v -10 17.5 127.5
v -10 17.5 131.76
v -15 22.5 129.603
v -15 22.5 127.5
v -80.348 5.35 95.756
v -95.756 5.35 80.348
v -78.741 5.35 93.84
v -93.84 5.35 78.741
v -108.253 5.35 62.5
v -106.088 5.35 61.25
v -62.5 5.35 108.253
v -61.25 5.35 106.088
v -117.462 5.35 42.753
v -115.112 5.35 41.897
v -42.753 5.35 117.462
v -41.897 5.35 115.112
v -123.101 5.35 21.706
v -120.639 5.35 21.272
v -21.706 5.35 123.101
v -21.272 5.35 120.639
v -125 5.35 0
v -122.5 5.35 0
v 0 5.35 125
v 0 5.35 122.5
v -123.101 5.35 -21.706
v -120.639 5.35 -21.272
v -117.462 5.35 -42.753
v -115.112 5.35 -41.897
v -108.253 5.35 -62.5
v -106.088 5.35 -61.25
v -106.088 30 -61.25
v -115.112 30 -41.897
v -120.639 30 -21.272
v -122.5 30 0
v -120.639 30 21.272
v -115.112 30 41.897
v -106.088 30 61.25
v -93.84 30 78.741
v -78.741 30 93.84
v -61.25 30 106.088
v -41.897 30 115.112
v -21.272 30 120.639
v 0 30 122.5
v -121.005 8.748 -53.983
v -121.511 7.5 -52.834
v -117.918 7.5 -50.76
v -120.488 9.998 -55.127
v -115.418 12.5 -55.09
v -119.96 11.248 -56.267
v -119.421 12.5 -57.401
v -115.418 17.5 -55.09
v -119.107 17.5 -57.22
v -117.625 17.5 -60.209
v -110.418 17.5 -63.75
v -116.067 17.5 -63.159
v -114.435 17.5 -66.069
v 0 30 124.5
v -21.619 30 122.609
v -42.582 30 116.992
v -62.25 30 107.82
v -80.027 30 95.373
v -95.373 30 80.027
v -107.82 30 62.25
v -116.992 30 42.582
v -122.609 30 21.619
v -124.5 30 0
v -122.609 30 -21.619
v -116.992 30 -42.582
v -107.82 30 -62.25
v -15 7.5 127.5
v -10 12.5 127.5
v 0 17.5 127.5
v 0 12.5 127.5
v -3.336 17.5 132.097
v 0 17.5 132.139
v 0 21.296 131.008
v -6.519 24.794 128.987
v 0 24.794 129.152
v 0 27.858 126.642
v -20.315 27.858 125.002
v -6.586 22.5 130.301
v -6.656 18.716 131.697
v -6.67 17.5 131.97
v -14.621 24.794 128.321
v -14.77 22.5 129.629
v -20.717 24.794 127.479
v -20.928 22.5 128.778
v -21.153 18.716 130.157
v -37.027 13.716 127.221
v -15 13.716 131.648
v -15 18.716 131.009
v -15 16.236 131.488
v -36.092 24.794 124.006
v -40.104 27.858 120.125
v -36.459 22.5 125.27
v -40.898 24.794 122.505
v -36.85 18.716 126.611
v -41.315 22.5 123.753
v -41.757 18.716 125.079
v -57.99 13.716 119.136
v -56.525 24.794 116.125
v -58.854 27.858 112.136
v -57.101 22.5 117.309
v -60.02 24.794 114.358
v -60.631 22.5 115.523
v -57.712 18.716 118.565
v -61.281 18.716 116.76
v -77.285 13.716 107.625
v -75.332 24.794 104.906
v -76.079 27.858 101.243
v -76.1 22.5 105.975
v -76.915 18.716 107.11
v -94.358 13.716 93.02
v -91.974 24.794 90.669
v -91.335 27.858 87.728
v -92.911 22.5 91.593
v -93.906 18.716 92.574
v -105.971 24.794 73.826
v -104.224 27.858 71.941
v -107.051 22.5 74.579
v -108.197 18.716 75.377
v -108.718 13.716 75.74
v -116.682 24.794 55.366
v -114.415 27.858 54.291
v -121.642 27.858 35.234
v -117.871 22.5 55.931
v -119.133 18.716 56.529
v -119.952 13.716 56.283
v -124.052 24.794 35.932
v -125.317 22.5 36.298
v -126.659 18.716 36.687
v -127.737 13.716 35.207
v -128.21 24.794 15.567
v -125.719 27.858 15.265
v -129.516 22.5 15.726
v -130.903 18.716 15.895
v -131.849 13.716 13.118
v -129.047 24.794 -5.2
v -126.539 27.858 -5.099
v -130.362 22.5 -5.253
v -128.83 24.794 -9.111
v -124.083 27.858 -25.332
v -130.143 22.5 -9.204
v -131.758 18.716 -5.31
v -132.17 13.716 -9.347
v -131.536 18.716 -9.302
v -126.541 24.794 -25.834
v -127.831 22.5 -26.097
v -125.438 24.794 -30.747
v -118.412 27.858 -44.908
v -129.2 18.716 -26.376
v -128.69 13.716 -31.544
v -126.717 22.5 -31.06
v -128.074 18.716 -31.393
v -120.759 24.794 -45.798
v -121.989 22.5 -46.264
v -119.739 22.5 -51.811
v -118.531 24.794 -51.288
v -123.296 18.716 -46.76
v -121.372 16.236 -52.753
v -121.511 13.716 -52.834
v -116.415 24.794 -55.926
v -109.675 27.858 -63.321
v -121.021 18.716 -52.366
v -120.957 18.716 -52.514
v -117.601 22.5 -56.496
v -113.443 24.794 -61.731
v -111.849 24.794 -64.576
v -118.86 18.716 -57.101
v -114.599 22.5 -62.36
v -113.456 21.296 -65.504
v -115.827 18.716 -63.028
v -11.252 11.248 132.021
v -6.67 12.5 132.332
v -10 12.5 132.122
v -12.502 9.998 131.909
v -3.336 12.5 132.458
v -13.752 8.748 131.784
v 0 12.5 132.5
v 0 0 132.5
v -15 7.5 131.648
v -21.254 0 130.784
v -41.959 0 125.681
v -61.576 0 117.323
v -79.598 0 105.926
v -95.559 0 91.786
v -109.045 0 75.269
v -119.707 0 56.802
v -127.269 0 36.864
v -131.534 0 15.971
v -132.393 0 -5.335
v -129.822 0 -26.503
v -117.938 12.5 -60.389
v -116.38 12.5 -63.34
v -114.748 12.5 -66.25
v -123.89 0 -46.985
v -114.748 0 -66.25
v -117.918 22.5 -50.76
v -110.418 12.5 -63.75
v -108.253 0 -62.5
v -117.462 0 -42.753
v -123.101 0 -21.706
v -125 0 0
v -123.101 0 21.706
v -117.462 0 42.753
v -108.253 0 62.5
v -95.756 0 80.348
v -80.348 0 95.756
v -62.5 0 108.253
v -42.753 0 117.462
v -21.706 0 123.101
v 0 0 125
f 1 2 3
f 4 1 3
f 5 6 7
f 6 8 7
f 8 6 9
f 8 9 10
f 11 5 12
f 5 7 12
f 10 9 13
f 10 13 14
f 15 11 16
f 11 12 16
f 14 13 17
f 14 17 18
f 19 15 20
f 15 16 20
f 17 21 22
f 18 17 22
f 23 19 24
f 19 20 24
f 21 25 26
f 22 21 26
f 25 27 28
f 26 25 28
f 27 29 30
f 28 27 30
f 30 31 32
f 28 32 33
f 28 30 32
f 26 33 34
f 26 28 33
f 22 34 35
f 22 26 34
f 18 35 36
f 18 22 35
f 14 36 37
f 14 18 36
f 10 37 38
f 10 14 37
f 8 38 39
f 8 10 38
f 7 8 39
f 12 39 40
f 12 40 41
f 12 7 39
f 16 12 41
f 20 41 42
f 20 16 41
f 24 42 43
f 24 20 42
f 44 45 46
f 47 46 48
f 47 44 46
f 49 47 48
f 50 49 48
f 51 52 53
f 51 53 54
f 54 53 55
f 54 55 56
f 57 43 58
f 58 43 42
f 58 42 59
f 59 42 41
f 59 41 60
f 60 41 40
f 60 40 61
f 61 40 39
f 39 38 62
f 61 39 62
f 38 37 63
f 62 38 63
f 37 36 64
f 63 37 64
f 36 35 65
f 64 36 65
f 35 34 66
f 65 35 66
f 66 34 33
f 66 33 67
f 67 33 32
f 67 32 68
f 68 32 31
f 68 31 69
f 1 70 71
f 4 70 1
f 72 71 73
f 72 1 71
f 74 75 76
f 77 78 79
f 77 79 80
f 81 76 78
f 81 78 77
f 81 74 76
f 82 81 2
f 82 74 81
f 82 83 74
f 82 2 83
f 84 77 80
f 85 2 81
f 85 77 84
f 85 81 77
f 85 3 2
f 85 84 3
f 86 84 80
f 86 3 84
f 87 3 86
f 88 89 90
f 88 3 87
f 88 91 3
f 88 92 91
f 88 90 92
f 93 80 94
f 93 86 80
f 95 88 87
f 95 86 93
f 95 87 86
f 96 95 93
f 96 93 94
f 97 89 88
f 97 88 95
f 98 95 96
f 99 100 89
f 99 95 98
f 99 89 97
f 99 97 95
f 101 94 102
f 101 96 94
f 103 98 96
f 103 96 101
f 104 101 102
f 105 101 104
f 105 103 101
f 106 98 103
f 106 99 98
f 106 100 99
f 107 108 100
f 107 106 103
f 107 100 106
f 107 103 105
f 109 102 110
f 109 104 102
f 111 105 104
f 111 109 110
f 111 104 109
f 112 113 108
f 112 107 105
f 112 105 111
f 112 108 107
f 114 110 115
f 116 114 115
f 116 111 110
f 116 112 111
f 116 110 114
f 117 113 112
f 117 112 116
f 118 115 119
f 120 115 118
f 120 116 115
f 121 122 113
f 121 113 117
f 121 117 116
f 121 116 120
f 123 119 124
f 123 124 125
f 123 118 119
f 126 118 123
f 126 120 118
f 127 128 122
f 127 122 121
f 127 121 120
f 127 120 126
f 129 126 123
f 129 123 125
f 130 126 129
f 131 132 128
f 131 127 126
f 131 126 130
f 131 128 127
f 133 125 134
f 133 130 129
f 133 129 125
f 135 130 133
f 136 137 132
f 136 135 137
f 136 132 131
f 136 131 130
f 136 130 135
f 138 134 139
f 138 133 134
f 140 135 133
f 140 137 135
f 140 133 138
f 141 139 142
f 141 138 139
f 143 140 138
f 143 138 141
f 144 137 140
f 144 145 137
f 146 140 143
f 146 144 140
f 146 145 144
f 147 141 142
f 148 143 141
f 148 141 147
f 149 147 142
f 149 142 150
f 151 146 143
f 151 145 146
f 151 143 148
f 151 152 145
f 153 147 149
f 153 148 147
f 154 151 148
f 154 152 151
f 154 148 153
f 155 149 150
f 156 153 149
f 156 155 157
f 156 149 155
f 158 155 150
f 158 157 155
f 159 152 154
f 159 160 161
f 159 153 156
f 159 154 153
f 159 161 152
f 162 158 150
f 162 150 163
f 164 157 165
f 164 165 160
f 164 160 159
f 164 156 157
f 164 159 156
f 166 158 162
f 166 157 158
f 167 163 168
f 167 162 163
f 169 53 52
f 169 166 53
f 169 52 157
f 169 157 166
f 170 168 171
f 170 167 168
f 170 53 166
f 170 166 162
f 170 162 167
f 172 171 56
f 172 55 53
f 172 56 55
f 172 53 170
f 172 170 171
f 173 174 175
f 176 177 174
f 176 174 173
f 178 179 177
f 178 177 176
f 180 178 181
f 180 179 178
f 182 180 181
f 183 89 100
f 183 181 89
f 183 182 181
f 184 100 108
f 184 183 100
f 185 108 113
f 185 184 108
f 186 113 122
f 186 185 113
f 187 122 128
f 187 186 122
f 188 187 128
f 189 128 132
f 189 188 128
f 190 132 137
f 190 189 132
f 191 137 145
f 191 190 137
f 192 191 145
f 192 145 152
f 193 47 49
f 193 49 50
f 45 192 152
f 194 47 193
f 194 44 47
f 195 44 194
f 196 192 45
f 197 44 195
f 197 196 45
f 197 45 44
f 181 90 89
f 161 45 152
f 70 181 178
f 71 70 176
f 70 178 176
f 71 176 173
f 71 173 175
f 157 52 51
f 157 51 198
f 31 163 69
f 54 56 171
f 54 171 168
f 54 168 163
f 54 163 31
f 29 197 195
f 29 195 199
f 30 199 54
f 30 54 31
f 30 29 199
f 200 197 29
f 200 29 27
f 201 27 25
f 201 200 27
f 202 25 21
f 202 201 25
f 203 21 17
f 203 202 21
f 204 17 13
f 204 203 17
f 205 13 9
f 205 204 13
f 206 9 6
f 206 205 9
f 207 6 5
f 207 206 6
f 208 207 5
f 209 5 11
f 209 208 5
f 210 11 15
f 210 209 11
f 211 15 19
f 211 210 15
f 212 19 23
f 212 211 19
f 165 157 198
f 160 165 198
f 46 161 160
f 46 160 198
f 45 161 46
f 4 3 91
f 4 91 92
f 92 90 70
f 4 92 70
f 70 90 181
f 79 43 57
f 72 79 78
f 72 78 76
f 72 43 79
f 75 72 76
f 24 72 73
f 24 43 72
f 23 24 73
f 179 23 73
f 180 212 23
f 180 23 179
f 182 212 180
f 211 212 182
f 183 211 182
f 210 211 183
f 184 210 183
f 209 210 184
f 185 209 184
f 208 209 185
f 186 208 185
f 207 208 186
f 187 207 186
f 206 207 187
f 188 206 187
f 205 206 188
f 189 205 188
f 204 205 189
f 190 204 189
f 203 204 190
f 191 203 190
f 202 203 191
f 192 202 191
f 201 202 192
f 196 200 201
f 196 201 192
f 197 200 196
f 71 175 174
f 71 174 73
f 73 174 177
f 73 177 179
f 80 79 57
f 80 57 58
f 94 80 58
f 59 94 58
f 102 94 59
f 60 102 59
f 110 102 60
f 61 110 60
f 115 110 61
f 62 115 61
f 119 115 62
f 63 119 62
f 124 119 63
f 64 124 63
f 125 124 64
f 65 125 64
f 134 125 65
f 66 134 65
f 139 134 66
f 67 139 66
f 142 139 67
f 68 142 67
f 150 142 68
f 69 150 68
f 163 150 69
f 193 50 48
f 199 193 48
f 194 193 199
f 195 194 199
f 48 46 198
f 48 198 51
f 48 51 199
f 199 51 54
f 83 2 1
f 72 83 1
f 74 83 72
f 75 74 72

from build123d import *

# Parameters (mm, degrees)
BOSS_EXTRUDE1_DEPTH = 30
SKETCH2_R           = 125
CUT_EXTRUDE1_DEPTH  = 5.35
SKETCH3_W           = 10
SKETCH3_H           = 5
CUT_EXTRUDE2_DEPTH  = 5
CHAMFER2_SIZE       = 8
FILLET1_R           = 20


with BuildPart() as part:
    # Sketch1 → Boss-Extrude1 (new body)
    with BuildSketch(Plane(origin=(0, 0, 0), x_dir=(1, 0, 0), z_dir=(0, 1, 0))):
        with BuildLine():
            Line((-114.748366001, 66.25), (-106.088111964, 61.25))
            ThreePointArc((-106.088111964, 61.25), (-106.088111964, -61.25), (0, -122.5))
            Line((0, -122.5), (0, -132.5))
            ThreePointArc((0, -132.5), (-114.748366001, -66.25), (-114.748366001, 66.25))
        make_face()
    extrude(amount=BOSS_EXTRUDE1_DEPTH)

    # Sketch2 → Cut-Extrude1 (cut)
    with BuildSketch(Plane(origin=(0, 0, 0), x_dir=(1, 0, 0), z_dir=(0, 1, 0))):
        Circle(SKETCH2_R)
    extrude(amount=CUT_EXTRUDE1_DEPTH, mode=Mode.SUBTRACT)

    # Sketch3 → Cut-Extrude2 (cut)
    with BuildSketch(Plane.XY.offset(132.5)):
        with Locations((-5, 15)):
            Rectangle(SKETCH3_W, SKETCH3_H)
        Polygon((-15, 22.5), (-15, 7.5), (-10, 12.5), (-10, 17.5), align=None)
    cut_extrude2 = extrude(amount=-CUT_EXTRUDE2_DEPTH, mode=Mode.SUBTRACT)

    # Mirror1: Cut-Extrude2 across plane
    add(cut_extrude2.mirror(Plane(origin=(0, 0, 0), x_dir=(-0.8660254037844389, 0, 0.4999999999999995), z_dir=(0.4999999999999996, 0, 0.8660254037844389))), mode=Mode.SUBTRACT)

    # Chamfer2
    # the kernel refuses this chamfer: 8 mm, written as the material it takes off along each edge
    with BuildSketch(Plane(origin=(0, 30, 0), x_dir=(0.1547578410621492, 0, 0.9879524333842102), z_dir=(0.9879524333842102, 0, -0.1547578410621492))) as chamfer2_piece_1:
        Polygon((132.5 - CHAMFER2_SIZE, 0), (132.5, CHAMFER2_SIZE), (132.5, 0), align=None)
    revolve(axis=Axis((0, 30, 0), (0, -1, 0)), revolution_arc=137.805504207, mode=Mode.SUBTRACT)

    # Fillet1
    # the kernel refuses this fillet: 20 mm, written as the material it takes off along each edge
    with BuildSketch(Plane(origin=(0, 22, 0), x_dir=(0.04293180283805991, 0, 0.9990780051152532), z_dir=(0.9990780051152532, 0, -0.04293180283805991))) as fillet1_piece_1:
        with BuildLine():
            CenterArc((132.5 - FILLET1_R, FILLET1_R * 0.414213562373), FILLET1_R, 315, 45)
            Line((132.5, FILLET1_R * 0.414213562373), (132.5, 0))
            Line((132.5, 0), (132.5 - FILLET1_R * 0.292893218813, -FILLET1_R * 0.292893218813))
        make_face()
    revolve(axis=Axis((0, 22, 0), (0, -1, 0)), revolution_arc=124.921134732, mode=Mode.SUBTRACT)


solid = part.part
